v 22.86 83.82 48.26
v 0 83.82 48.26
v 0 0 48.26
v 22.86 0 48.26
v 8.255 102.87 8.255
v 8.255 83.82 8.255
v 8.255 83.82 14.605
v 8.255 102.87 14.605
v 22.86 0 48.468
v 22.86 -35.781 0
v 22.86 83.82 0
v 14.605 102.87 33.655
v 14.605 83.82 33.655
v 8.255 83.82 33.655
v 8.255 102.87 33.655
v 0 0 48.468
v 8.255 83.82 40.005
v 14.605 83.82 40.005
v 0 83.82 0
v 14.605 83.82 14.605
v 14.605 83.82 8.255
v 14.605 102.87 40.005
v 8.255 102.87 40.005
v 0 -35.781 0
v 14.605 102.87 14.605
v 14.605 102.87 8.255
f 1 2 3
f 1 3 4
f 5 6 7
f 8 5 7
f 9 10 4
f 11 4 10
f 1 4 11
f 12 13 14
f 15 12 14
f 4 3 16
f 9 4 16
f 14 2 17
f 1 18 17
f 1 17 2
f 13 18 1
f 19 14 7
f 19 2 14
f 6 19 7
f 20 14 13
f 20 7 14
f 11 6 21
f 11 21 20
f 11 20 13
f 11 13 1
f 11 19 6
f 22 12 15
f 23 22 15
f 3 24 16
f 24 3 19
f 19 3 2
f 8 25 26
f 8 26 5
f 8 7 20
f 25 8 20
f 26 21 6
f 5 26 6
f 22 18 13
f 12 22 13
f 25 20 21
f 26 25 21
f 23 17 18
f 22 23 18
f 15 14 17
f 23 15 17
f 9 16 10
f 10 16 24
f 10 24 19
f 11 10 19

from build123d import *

# Parameters (mm, degrees)
F0_W     = 22.86
F0_H     = 83.82
F1_DEPTH = 48.26
F3_DEPTH = 19.05
F5_DEPTH = 22.86


with BuildPart() as f1:
    # F0 (on Top) → F1 (new body)
    with BuildSketch(Plane.XY):
        with Locations((11.43, 41.91)):
            Rectangle(F0_W, F0_H)
    extrude(amount=F1_DEPTH)

    # F2 (on face) → F3 (join)
    with BuildSketch(Plane(origin=(0, 83.82, 0), x_dir=(-1, 0, 0), z_dir=(0, 1, 0))):
        Polygon((-8.255, 40.005), (-11.43, 40.005), (-11.43, 36.83), (-11.43, 33.655), (-8.255, 33.655), align=None)
        Polygon((-8.255, 14.605), (-11.43, 14.605), (-14.605, 14.605), (-14.605, 8.255), (-8.255, 8.255), align=None)
        Polygon((-11.43, 36.83), (-11.43, 40.005), (-14.605, 40.005), (-14.605, 33.655), (-11.43, 33.655), align=None)
    extrude(amount=F3_DEPTH)

    # F4 (on Right) → F5 (join)
    with BuildSketch(Plane.YZ):
        Polygon((-35.780966, 0), (0, 0), (0, 48.468489), align=None)
    extrude(amount=F5_DEPTH)


solid = f1.part
